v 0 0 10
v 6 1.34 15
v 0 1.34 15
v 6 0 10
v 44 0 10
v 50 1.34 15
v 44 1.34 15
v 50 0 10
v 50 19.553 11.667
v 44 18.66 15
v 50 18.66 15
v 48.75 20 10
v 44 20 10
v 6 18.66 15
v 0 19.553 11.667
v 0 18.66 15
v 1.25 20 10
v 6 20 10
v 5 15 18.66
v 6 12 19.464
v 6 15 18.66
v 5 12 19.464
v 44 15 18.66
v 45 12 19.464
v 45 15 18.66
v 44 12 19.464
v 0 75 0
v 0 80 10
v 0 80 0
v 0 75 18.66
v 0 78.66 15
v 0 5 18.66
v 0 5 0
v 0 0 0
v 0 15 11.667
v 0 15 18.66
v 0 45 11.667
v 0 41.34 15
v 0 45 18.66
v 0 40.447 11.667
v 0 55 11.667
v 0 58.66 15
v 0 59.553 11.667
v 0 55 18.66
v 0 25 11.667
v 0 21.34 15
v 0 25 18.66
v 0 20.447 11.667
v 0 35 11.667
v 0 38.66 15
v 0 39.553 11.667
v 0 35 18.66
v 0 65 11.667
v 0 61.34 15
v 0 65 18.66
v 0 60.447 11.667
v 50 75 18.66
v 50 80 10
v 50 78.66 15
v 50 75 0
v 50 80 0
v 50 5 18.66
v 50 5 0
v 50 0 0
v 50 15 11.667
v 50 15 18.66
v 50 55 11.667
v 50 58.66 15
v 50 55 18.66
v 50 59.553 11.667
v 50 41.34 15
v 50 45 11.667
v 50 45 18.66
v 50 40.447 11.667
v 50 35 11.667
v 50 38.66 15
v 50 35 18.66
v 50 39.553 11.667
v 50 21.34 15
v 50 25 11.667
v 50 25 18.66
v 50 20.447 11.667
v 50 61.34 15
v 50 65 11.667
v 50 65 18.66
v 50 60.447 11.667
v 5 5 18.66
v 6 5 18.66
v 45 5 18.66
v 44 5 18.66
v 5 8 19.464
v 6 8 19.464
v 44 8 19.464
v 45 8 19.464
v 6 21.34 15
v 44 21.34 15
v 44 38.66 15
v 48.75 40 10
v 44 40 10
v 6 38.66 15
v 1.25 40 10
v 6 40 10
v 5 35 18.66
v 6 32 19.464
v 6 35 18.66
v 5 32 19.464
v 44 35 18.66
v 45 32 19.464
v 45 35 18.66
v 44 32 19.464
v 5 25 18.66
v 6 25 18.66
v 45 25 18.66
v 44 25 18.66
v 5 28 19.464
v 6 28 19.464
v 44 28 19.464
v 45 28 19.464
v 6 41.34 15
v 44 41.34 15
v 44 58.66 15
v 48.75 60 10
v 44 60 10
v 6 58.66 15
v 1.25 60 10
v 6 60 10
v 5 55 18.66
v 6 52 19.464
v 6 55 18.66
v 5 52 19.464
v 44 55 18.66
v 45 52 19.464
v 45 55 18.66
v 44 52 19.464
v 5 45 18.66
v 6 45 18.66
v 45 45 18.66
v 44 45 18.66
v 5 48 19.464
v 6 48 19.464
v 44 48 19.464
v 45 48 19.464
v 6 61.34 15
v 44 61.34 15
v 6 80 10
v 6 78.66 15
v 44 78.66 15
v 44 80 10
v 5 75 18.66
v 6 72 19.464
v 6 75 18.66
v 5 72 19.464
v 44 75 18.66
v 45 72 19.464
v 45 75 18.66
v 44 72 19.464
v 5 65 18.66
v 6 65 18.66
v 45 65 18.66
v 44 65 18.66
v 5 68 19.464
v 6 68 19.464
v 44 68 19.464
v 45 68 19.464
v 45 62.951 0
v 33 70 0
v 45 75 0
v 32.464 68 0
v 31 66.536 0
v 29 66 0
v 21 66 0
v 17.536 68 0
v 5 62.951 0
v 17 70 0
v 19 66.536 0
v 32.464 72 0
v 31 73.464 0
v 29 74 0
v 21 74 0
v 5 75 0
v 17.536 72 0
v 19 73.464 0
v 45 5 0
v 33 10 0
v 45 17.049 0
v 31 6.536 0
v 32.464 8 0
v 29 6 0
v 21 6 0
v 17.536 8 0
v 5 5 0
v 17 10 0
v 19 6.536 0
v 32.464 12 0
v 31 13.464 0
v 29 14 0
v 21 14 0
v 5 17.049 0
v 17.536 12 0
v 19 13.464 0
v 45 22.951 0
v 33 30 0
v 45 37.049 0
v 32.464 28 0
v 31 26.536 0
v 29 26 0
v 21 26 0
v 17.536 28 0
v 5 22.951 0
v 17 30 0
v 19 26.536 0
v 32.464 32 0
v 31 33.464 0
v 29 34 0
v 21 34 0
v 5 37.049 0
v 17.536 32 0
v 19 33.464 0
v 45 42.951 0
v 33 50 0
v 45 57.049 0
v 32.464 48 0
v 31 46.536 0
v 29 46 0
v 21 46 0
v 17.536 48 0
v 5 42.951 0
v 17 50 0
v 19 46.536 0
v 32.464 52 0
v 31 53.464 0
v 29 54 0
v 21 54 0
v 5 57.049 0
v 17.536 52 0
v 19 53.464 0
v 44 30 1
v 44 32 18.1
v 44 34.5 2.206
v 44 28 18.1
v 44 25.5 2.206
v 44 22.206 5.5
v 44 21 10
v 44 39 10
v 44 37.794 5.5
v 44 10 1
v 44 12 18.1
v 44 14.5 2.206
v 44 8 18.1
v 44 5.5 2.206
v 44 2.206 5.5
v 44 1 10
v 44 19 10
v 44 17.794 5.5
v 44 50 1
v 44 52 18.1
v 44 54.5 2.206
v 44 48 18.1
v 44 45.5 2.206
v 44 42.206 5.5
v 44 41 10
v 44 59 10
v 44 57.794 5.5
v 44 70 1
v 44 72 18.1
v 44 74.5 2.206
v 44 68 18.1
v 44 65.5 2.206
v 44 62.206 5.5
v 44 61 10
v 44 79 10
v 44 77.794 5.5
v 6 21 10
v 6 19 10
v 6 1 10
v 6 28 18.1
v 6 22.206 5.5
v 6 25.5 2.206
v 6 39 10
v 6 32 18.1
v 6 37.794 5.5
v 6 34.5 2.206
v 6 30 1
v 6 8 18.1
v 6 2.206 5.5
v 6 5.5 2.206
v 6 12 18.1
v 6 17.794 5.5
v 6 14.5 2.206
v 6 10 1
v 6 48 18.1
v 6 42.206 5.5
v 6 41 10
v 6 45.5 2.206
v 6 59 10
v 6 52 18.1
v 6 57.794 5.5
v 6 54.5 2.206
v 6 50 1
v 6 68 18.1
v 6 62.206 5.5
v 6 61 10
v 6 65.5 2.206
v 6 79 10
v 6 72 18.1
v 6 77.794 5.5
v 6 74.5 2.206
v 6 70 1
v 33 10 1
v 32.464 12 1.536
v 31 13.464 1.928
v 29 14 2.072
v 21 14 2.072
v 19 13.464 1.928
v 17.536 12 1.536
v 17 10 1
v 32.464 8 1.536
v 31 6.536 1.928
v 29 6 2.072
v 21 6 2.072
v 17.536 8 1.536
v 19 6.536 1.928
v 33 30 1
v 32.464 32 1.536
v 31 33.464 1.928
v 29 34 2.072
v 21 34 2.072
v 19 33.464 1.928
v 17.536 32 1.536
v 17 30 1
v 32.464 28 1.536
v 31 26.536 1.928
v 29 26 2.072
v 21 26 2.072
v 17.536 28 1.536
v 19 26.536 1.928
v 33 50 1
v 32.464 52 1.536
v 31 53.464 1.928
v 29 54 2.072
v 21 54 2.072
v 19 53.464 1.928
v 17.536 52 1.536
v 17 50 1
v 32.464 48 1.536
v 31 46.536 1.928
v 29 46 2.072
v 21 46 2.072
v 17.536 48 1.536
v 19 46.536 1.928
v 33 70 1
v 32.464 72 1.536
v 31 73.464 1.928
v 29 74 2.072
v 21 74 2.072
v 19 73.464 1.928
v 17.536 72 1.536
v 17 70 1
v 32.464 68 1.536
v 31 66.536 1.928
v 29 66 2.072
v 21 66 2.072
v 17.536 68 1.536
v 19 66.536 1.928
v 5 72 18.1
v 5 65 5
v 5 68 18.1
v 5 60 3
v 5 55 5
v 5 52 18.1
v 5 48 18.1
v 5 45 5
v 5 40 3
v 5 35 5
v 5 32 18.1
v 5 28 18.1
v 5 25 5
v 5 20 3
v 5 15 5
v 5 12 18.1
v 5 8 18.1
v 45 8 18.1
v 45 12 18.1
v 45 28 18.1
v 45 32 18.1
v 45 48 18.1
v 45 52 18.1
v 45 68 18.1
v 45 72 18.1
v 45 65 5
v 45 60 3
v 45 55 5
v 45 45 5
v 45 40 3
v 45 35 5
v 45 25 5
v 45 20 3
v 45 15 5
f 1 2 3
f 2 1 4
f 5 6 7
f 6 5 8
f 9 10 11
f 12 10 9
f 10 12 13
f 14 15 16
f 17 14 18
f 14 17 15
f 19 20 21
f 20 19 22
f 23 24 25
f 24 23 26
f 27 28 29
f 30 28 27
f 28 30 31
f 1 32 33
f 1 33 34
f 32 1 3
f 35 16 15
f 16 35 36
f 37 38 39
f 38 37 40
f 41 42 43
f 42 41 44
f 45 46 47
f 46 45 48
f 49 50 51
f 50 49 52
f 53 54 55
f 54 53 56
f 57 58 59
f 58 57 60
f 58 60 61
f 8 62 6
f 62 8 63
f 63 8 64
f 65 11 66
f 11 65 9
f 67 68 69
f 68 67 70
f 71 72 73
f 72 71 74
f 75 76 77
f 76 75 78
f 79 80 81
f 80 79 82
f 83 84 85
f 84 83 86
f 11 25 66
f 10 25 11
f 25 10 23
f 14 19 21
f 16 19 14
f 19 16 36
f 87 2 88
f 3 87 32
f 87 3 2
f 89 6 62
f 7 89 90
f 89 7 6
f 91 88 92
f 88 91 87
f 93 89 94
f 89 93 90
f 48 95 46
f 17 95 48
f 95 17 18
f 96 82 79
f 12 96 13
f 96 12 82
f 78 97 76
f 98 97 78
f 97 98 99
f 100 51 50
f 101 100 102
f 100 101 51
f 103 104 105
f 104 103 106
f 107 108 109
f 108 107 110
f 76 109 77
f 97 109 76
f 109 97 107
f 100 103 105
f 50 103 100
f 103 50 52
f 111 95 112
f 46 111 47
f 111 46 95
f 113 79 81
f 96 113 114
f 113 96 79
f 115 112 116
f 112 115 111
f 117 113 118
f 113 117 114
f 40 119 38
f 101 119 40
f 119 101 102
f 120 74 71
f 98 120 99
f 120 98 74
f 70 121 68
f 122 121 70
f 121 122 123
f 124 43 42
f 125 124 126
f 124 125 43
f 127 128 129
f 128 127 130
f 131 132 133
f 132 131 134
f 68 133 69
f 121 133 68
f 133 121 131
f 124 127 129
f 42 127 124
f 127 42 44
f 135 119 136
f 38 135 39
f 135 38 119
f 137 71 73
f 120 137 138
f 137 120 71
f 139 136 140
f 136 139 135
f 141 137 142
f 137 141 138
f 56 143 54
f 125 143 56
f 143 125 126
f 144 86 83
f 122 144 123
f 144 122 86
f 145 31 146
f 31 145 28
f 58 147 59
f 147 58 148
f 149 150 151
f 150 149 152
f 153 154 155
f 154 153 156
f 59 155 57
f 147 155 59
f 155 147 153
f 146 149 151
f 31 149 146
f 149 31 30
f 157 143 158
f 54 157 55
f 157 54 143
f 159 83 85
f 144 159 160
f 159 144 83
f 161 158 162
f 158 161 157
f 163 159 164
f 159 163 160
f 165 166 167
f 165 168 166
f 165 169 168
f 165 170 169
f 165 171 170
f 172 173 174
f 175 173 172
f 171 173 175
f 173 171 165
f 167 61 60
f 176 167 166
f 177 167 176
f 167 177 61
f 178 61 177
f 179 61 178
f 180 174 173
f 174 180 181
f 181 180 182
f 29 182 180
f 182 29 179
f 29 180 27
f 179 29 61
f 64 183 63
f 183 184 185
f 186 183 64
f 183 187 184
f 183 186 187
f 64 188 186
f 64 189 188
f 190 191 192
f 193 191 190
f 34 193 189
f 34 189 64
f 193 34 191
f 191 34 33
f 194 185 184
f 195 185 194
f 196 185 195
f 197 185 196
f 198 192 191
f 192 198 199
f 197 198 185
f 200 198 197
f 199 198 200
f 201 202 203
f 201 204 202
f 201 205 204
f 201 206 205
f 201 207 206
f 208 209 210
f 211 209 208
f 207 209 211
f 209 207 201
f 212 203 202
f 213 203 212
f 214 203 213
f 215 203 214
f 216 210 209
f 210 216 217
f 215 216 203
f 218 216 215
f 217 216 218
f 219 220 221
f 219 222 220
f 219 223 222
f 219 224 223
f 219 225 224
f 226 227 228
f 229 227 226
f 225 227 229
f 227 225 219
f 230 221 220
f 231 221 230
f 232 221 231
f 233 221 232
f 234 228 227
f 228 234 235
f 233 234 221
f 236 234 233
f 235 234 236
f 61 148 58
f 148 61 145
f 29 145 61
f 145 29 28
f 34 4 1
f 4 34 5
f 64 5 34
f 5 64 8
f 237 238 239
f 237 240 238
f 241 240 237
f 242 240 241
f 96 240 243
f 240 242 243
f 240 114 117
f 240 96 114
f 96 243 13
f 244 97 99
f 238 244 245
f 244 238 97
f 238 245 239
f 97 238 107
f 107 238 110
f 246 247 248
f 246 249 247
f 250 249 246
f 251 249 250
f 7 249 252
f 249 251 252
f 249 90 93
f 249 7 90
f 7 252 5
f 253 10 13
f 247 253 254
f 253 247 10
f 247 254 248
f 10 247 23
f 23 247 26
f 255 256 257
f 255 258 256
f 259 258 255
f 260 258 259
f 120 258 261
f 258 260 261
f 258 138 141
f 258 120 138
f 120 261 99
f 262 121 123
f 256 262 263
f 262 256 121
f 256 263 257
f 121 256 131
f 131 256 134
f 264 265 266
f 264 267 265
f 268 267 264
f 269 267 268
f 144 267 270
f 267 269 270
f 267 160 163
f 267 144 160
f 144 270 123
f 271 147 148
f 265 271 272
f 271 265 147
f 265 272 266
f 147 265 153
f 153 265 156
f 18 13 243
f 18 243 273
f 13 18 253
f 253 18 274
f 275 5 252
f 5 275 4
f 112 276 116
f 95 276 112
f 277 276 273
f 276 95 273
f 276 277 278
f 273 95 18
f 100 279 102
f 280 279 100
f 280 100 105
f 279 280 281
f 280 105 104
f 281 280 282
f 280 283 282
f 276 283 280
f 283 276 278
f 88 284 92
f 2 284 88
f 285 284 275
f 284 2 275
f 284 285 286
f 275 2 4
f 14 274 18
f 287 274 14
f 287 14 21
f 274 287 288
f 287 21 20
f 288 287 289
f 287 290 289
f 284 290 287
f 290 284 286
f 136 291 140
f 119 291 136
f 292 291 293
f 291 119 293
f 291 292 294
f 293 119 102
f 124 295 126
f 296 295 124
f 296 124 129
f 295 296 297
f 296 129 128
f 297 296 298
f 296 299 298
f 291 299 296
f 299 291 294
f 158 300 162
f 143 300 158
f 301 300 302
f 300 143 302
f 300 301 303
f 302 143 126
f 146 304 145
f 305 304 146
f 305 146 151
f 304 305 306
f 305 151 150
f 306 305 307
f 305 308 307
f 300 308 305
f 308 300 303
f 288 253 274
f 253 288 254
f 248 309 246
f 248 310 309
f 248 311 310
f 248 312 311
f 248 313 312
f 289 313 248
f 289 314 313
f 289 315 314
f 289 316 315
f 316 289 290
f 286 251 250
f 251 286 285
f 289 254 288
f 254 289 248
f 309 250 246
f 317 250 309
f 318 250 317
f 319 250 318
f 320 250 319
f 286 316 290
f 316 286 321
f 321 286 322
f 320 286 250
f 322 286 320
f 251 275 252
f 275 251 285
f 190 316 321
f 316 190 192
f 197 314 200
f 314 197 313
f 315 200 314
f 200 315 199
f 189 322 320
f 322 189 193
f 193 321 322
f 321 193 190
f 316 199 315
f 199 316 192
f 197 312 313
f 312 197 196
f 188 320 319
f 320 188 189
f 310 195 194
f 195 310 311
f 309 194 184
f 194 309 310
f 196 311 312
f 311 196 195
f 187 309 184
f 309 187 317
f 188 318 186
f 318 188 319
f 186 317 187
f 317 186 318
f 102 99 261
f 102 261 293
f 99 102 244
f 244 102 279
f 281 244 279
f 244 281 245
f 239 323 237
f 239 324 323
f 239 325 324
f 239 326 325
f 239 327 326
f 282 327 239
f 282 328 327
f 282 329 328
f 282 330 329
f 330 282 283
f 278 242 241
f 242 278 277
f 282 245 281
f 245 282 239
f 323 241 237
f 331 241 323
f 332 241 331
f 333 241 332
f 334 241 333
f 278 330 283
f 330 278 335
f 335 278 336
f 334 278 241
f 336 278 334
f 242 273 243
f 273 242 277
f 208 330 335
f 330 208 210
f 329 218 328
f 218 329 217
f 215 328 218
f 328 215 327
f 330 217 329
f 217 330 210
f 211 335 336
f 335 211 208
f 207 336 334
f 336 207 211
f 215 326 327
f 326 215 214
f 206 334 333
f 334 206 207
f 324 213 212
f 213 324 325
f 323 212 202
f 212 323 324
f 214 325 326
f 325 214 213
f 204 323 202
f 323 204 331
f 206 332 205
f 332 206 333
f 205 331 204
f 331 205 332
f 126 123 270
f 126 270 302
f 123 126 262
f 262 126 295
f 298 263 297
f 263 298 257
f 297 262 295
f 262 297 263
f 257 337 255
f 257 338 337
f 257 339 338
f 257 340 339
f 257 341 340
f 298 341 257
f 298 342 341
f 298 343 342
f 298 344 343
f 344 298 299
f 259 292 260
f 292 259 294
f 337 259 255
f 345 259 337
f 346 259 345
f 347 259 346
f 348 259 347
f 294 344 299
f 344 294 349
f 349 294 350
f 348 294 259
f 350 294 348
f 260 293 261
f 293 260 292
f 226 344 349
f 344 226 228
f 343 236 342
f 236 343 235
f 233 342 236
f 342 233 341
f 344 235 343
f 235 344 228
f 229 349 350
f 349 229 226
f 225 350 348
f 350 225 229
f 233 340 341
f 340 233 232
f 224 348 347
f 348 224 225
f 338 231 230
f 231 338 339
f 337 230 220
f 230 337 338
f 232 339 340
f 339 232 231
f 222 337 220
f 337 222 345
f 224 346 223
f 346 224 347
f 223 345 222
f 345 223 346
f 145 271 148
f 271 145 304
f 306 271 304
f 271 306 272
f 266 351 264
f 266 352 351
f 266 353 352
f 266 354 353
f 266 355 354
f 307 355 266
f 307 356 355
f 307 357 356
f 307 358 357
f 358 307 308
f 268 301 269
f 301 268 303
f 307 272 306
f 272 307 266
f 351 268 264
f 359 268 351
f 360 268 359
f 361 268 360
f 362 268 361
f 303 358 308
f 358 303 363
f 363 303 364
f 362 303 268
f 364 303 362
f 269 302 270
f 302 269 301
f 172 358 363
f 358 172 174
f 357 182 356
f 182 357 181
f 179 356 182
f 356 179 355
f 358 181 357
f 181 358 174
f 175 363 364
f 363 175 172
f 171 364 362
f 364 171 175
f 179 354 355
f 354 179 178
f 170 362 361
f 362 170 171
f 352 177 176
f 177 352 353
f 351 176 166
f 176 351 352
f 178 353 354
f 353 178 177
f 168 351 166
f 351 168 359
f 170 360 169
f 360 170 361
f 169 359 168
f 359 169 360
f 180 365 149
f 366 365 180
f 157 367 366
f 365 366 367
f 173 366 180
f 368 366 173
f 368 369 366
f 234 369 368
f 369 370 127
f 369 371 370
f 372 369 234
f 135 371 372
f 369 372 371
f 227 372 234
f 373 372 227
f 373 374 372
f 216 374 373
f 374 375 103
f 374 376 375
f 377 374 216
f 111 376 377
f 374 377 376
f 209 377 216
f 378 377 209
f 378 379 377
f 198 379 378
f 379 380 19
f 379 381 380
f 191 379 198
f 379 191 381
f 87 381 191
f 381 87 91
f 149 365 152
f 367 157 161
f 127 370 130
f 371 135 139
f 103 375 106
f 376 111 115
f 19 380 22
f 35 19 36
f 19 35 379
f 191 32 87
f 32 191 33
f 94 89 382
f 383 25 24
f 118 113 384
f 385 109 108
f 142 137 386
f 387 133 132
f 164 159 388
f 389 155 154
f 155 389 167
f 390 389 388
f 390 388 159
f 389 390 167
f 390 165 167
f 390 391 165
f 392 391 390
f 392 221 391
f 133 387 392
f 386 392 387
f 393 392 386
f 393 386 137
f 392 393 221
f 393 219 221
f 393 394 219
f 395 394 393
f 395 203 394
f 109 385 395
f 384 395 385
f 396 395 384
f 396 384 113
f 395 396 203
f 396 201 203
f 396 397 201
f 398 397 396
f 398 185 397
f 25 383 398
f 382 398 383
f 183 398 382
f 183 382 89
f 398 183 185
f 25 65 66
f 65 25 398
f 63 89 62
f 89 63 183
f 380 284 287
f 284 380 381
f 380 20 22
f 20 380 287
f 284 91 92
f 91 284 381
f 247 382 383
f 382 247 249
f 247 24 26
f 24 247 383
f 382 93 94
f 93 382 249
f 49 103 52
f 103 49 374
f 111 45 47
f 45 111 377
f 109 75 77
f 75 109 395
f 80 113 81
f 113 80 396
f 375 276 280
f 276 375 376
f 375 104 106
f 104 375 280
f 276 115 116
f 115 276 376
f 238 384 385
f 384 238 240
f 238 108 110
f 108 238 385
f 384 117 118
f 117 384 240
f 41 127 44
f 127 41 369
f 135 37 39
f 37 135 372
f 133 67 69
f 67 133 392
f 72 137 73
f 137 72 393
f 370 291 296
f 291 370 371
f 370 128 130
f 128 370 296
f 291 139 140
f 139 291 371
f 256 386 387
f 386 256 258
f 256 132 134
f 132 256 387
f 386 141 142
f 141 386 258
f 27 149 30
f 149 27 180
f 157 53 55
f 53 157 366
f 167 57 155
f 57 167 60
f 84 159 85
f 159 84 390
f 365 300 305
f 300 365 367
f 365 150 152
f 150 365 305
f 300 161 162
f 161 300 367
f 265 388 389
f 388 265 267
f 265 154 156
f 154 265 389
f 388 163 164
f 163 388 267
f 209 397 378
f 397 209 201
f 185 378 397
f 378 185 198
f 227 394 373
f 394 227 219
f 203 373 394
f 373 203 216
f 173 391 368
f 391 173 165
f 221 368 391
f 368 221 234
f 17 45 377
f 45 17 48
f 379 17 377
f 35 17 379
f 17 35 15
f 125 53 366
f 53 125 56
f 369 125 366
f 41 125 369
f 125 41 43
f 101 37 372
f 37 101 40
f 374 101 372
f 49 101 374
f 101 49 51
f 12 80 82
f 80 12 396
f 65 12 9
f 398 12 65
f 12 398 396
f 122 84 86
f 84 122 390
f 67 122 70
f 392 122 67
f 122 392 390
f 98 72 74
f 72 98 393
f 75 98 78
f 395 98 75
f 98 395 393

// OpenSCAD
// INPUTS #############################

$fn = 12;

// MODULES ############################
// HELPERS ############################
// GLOBAL PARAMETERS ##################

function d_ext() = 20;
function d_batterie() = 18; // 15~17mm
function h_batterie() = 38; // ~35mm
function h_espacement() = 1;
function h_bord() = 5; // pour les bords
function h_creux() = 10; // creux dans les bords
function h_plaque() = 2;
function l_plaque() = 4;
function l_passage() = 6;
function d_ouverture() = 8;
function h_ouverture() = 8;

function h_socle() = h_batterie()+(h_bord()+h_espacement())*2;

// BASE ###############################

difference() {
    union() { // base du support
        cube([h_socle(),d_ext()*4,d_ext()/2]);
        for (i = [0:3])
        translate([0,d_ext()/2+i*d_ext(),d_ext()/2])
        rotate([0,90,0])
        cylinder(d=d_ext(),h=h_socle());
    }
    for (i = [0:3]) {
        translate([h_espacement()+h_bord(),i*d_ext(),d_ext()/2]) {
            translate([0,-0.1,0])
            cube([h_batterie(),d_ext()+0.2,d_ext()/2+0.1]); // emplacement de la batterie
            translate([0,d_ext()/2,0])
            rotate([0,90,0])
            cylinder(d=d_batterie(),h=h_batterie()); // ouverture de la batterie
        }
        translate([-0.1,(d_ext()-h_creux())/2+i*d_ext(),-0.1])
        cube([h_bord()+0.1,h_creux(),d_ext()+0.2]); // creux dans le premier bord
        translate([h_socle()-h_bord(),(d_ext()-h_creux())/2+i*d_ext(),-0.1])
        cube([h_bord()+0.1,h_creux(),d_ext()+0.2]); // creux dans le deuxième bord
        translate([h_bord()-0.1,(d_ext()-l_plaque())/2+i*d_ext(),d_ext()-h_plaque()+0.1])
        cube([h_espacement()+0.2,l_plaque(),h_plaque()+0.1]); // passage plaque du premier bord
        translate(
            [h_bord()+h_espacement()+h_batterie()-0.1
            ,(d_ext()-l_plaque())/2+i*d_ext()
            ,d_ext()-h_plaque()+0.1]
        )
        cube([h_espacement()+0.2,l_plaque(),h_plaque()+0.1]); // passage plaque du deuxième bord
        translate([h_socle()/2,d_ext()/2+i*d_ext(),-0.1]) { // ouverture pour pousser la batterie
            translate([h_ouverture()/-2,0,0])
            cylinder(d=d_ouverture(),h=d_ext()/2);
            translate([h_ouverture()/-2,d_ouverture()/-2,0])
            cube([h_ouverture(),d_ouverture(),d_ext()/2]);
            translate([h_ouverture()/2,0,0])
            cylinder(d=d_ouverture(),h=d_ext()/2);
        }
    }
    points = [
        [-0.1,-0.1],
        [h_bord(),-0.1],
        [h_bord(),d_ext()/4],
        [0,d_ext()/3+h_bord()],
        [-0.1,d_ext()/3+h_bord()]
    ];
    translate([0,d_ext()*3.5,0])
    rotate([90,0,0])
    linear_extrude(height=d_ext()*3)
    polygon(points); // passage câbles bas premier bord
    translate([h_socle(),d_ext()/2,0])
    rotate([90,0,180])
    linear_extrude(height=d_ext()*3)
    polygon(points); // passage câbles bas deuxième bord
    triangles = [
        [l_passage()/-2,-0.05],
        [0,l_passage()/2],
        [l_passage()/2,-0.05]
    ];
    for (i = [1:3])
    translate([0,d_ext()*i,0])
    rotate([90,0,90])
    linear_extrude(height=h_socle())
    polygon(triangles); // passages des câbles d'un bord à l'autre
}
